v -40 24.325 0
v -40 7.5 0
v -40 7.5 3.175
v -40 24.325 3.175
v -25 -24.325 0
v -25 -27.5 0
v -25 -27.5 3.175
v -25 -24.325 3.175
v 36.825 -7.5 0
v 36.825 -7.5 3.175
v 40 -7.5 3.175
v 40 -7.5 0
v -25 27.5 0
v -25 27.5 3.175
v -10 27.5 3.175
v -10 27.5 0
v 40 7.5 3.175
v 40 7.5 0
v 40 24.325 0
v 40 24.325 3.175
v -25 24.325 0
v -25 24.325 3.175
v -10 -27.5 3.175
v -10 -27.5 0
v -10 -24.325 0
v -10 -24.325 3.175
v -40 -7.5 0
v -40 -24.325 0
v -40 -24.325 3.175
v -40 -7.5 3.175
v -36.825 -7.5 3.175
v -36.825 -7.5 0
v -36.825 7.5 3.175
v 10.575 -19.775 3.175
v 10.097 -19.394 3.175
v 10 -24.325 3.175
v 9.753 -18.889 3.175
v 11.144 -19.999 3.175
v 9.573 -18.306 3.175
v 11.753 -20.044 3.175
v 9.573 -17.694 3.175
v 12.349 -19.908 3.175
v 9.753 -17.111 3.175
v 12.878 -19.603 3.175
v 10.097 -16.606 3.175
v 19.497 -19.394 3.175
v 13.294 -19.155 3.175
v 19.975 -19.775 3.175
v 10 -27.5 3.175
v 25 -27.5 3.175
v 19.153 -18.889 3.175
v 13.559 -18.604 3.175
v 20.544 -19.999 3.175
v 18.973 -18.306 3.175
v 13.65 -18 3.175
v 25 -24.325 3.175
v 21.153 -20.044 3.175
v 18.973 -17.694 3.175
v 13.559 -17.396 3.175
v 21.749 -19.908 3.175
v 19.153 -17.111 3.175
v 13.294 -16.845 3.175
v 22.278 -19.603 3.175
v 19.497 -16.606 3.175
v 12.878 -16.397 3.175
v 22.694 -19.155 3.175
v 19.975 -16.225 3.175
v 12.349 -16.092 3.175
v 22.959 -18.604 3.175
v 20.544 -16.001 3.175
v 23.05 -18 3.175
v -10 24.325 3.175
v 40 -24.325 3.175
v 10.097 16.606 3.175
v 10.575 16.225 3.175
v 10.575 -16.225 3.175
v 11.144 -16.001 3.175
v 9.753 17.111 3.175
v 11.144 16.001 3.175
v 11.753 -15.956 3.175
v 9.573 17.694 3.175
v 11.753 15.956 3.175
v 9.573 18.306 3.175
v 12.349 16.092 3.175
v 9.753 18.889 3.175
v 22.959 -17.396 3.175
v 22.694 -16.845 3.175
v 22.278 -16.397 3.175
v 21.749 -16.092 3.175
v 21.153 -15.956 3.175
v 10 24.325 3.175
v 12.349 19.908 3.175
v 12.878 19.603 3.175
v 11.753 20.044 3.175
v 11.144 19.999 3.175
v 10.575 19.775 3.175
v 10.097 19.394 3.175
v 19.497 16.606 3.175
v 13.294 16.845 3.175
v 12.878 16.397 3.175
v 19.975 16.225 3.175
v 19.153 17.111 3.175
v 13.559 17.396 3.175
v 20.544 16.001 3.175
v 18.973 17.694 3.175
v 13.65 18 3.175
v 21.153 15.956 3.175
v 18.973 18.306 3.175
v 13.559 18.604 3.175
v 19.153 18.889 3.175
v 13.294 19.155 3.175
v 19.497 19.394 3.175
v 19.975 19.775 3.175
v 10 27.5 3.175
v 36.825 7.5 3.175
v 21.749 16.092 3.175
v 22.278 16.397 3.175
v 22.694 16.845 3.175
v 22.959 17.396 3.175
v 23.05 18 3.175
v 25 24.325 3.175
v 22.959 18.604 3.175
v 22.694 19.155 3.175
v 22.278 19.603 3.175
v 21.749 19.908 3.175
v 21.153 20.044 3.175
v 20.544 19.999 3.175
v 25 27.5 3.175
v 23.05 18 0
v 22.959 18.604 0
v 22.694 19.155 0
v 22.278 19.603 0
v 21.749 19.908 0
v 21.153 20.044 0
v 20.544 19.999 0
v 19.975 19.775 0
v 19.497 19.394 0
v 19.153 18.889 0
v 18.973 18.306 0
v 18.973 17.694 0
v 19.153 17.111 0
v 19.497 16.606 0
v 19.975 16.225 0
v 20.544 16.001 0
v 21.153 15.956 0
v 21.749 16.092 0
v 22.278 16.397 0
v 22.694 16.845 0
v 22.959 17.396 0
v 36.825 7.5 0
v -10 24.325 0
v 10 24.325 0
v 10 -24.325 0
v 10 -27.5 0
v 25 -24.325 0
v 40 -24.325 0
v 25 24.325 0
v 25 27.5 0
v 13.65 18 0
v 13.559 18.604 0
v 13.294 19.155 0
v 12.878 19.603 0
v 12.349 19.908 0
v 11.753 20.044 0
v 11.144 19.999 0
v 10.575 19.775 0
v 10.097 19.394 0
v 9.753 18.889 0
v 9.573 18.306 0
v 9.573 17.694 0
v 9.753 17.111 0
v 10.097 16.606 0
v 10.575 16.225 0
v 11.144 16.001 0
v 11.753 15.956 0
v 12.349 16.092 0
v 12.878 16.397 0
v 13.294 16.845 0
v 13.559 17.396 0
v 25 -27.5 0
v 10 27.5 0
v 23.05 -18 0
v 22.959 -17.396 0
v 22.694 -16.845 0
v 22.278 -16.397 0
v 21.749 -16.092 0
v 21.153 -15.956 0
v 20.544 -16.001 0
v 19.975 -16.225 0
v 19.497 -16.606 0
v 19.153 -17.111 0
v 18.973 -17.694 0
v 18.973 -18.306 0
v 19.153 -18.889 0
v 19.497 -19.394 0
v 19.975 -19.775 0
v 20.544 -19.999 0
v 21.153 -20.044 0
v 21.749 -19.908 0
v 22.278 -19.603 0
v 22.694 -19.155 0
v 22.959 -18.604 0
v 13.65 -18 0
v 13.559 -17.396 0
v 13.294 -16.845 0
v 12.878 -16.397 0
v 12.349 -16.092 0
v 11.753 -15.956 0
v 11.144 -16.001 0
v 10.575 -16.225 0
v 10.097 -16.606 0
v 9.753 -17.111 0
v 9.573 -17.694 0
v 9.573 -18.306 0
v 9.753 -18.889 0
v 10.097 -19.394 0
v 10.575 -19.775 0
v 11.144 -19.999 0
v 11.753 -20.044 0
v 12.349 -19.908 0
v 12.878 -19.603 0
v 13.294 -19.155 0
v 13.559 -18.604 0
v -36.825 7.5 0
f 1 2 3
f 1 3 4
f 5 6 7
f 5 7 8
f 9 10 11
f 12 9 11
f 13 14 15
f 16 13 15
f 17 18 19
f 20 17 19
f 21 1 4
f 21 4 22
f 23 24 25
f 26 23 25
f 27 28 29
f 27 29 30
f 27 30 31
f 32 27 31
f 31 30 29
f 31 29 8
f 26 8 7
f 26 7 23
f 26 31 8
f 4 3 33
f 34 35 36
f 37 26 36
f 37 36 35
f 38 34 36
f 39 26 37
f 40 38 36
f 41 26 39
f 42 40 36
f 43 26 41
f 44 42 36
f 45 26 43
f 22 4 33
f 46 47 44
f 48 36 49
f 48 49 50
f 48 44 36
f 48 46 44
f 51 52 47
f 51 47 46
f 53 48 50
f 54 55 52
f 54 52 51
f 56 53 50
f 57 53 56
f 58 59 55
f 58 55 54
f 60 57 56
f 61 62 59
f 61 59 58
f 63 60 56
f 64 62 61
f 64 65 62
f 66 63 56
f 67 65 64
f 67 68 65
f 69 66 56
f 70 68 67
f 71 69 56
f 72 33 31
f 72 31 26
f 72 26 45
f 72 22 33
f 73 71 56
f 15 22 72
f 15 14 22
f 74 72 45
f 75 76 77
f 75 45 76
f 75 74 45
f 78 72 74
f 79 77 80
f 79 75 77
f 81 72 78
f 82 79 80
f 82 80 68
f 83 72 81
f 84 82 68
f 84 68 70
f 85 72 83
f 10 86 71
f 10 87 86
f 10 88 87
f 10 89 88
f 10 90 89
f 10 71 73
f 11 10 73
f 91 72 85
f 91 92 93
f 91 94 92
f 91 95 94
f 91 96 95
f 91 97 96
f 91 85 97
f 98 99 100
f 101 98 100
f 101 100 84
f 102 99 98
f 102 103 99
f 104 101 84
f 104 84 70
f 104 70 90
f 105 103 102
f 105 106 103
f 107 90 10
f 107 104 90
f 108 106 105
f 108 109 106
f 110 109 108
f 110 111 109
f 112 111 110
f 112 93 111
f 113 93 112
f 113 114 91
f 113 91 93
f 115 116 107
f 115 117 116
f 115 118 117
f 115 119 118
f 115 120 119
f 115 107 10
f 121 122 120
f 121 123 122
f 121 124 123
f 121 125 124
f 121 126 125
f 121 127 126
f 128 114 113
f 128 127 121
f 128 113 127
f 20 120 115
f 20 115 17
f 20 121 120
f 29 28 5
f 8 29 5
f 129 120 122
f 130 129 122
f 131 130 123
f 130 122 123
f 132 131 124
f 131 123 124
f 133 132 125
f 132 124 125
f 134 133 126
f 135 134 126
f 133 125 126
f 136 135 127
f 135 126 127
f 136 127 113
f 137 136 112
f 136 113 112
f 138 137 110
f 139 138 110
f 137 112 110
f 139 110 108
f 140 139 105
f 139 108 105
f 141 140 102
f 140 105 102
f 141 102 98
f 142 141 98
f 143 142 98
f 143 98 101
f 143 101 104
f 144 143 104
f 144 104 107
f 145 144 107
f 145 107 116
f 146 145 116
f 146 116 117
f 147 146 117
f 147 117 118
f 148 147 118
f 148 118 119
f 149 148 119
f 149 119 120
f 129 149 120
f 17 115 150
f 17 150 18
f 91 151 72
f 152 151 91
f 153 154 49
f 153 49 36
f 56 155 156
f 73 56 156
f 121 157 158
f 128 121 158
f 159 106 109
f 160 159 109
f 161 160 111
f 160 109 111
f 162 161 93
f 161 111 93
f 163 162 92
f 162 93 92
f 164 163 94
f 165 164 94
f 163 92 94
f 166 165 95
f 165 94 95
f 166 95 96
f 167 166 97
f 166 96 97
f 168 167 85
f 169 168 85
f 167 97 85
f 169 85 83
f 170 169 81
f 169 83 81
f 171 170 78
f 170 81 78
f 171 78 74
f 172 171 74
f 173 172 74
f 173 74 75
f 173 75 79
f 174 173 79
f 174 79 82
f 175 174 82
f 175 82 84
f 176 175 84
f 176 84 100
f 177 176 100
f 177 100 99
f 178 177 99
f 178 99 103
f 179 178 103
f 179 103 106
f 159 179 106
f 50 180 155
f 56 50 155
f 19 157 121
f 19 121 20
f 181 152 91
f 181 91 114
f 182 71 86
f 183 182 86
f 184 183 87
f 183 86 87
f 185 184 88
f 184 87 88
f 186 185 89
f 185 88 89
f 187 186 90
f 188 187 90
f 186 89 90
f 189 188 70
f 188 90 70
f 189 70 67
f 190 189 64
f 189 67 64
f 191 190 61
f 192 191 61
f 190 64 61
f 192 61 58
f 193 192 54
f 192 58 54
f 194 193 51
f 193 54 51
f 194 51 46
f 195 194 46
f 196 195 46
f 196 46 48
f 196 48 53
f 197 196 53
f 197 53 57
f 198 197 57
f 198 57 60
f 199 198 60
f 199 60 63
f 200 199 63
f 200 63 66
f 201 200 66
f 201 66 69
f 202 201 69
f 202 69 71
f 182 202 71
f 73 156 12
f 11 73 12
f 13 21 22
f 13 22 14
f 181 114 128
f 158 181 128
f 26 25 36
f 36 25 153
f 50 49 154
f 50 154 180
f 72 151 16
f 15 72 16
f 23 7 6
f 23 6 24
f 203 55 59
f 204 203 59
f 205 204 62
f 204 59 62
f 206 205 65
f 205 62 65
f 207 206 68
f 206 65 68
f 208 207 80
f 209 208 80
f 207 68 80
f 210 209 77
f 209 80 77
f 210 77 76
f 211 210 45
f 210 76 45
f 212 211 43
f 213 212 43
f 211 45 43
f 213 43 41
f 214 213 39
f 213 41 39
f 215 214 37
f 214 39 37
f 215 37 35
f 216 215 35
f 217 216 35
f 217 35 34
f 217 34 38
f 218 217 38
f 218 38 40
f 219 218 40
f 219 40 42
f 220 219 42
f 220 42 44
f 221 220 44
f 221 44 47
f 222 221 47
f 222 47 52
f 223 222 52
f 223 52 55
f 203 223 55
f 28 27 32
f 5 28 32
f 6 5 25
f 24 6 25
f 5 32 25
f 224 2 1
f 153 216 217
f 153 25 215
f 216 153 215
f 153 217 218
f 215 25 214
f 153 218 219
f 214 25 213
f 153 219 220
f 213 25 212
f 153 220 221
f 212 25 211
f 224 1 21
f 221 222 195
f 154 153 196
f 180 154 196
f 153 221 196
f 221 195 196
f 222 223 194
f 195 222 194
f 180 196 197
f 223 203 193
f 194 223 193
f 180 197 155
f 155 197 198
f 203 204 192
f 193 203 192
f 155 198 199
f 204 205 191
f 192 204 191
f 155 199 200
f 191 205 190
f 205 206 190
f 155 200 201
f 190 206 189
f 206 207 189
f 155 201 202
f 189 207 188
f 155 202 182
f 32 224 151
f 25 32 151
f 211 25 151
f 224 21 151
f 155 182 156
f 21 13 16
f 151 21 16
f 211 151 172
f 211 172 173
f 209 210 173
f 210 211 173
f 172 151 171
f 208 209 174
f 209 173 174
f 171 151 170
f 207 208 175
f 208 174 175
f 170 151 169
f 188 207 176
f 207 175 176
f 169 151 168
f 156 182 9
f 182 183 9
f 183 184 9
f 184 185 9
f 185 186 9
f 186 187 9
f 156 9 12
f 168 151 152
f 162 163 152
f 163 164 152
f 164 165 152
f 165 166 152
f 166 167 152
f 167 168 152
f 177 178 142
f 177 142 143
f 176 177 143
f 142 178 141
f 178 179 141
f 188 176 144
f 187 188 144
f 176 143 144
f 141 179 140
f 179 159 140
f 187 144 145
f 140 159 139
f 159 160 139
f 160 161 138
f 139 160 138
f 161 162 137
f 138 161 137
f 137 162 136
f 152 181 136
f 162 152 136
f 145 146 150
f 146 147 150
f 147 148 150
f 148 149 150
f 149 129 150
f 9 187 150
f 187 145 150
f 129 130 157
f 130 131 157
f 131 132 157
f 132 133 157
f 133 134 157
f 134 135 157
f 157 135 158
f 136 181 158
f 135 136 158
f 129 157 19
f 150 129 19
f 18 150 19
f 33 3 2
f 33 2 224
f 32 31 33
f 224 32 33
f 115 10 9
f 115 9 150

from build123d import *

# Parameters (mm, degrees)
F1_W     = 80
F1_H     = 48.65
F2_DEPTH = 3.175
F3_W     = 15
F3_H     = 3.175
F4_DEPTH = 3.175
F5_W     = 3.175
F5_H     = 15
F6_DEPTH = 3.176
F7_R     = 2.05
F8_DEPTH = 3.176


with BuildPart() as f2:
    # F1 (on Top) → F2 (new body)
    with BuildSketch(Plane.XY):
        Rectangle(F1_W, F1_H)
    extrude(amount=F2_DEPTH)

    # F3 (on face) → F4 (join, through all)
    with BuildSketch(Plane.XY.offset(3.175)):
        with Locations((-17.5, -25.9125)):
            Rectangle(F3_W, F3_H)
        with Locations((17.5, -25.9125)):
            Rectangle(F3_W, F3_H)
        with Locations((-17.5, 25.9125)):
            Rectangle(F3_W, F3_H)
        with Locations((17.5, 25.9125)):
            Rectangle(F3_W, F3_H)
    extrude(amount=-F4_DEPTH)

    # F5 (on face) → F6 (cut, through all)
    with BuildSketch(Plane.XY.offset(3.175)):
        with Locations((38.4125, 0)):
            Rectangle(F5_W, F5_H)
        with Locations((-38.4125, 0)):
            Rectangle(F5_W, F5_H)
    extrude(amount=-F6_DEPTH, mode=Mode.SUBTRACT)

    # F7 (on face) → F8 (cut, through all)
    with BuildSketch(Plane.XY.offset(3.175)):
        with Locations((11.6, 18)):
            Circle(F7_R)
        with Locations((21, 18)):
            Circle(F7_R)
        with Locations((21, -18)):
            Circle(F7_R)
        with Locations((11.6, -18)):
            Circle(F7_R)
    extrude(amount=-F8_DEPTH, mode=Mode.SUBTRACT)


solid = f2.part
